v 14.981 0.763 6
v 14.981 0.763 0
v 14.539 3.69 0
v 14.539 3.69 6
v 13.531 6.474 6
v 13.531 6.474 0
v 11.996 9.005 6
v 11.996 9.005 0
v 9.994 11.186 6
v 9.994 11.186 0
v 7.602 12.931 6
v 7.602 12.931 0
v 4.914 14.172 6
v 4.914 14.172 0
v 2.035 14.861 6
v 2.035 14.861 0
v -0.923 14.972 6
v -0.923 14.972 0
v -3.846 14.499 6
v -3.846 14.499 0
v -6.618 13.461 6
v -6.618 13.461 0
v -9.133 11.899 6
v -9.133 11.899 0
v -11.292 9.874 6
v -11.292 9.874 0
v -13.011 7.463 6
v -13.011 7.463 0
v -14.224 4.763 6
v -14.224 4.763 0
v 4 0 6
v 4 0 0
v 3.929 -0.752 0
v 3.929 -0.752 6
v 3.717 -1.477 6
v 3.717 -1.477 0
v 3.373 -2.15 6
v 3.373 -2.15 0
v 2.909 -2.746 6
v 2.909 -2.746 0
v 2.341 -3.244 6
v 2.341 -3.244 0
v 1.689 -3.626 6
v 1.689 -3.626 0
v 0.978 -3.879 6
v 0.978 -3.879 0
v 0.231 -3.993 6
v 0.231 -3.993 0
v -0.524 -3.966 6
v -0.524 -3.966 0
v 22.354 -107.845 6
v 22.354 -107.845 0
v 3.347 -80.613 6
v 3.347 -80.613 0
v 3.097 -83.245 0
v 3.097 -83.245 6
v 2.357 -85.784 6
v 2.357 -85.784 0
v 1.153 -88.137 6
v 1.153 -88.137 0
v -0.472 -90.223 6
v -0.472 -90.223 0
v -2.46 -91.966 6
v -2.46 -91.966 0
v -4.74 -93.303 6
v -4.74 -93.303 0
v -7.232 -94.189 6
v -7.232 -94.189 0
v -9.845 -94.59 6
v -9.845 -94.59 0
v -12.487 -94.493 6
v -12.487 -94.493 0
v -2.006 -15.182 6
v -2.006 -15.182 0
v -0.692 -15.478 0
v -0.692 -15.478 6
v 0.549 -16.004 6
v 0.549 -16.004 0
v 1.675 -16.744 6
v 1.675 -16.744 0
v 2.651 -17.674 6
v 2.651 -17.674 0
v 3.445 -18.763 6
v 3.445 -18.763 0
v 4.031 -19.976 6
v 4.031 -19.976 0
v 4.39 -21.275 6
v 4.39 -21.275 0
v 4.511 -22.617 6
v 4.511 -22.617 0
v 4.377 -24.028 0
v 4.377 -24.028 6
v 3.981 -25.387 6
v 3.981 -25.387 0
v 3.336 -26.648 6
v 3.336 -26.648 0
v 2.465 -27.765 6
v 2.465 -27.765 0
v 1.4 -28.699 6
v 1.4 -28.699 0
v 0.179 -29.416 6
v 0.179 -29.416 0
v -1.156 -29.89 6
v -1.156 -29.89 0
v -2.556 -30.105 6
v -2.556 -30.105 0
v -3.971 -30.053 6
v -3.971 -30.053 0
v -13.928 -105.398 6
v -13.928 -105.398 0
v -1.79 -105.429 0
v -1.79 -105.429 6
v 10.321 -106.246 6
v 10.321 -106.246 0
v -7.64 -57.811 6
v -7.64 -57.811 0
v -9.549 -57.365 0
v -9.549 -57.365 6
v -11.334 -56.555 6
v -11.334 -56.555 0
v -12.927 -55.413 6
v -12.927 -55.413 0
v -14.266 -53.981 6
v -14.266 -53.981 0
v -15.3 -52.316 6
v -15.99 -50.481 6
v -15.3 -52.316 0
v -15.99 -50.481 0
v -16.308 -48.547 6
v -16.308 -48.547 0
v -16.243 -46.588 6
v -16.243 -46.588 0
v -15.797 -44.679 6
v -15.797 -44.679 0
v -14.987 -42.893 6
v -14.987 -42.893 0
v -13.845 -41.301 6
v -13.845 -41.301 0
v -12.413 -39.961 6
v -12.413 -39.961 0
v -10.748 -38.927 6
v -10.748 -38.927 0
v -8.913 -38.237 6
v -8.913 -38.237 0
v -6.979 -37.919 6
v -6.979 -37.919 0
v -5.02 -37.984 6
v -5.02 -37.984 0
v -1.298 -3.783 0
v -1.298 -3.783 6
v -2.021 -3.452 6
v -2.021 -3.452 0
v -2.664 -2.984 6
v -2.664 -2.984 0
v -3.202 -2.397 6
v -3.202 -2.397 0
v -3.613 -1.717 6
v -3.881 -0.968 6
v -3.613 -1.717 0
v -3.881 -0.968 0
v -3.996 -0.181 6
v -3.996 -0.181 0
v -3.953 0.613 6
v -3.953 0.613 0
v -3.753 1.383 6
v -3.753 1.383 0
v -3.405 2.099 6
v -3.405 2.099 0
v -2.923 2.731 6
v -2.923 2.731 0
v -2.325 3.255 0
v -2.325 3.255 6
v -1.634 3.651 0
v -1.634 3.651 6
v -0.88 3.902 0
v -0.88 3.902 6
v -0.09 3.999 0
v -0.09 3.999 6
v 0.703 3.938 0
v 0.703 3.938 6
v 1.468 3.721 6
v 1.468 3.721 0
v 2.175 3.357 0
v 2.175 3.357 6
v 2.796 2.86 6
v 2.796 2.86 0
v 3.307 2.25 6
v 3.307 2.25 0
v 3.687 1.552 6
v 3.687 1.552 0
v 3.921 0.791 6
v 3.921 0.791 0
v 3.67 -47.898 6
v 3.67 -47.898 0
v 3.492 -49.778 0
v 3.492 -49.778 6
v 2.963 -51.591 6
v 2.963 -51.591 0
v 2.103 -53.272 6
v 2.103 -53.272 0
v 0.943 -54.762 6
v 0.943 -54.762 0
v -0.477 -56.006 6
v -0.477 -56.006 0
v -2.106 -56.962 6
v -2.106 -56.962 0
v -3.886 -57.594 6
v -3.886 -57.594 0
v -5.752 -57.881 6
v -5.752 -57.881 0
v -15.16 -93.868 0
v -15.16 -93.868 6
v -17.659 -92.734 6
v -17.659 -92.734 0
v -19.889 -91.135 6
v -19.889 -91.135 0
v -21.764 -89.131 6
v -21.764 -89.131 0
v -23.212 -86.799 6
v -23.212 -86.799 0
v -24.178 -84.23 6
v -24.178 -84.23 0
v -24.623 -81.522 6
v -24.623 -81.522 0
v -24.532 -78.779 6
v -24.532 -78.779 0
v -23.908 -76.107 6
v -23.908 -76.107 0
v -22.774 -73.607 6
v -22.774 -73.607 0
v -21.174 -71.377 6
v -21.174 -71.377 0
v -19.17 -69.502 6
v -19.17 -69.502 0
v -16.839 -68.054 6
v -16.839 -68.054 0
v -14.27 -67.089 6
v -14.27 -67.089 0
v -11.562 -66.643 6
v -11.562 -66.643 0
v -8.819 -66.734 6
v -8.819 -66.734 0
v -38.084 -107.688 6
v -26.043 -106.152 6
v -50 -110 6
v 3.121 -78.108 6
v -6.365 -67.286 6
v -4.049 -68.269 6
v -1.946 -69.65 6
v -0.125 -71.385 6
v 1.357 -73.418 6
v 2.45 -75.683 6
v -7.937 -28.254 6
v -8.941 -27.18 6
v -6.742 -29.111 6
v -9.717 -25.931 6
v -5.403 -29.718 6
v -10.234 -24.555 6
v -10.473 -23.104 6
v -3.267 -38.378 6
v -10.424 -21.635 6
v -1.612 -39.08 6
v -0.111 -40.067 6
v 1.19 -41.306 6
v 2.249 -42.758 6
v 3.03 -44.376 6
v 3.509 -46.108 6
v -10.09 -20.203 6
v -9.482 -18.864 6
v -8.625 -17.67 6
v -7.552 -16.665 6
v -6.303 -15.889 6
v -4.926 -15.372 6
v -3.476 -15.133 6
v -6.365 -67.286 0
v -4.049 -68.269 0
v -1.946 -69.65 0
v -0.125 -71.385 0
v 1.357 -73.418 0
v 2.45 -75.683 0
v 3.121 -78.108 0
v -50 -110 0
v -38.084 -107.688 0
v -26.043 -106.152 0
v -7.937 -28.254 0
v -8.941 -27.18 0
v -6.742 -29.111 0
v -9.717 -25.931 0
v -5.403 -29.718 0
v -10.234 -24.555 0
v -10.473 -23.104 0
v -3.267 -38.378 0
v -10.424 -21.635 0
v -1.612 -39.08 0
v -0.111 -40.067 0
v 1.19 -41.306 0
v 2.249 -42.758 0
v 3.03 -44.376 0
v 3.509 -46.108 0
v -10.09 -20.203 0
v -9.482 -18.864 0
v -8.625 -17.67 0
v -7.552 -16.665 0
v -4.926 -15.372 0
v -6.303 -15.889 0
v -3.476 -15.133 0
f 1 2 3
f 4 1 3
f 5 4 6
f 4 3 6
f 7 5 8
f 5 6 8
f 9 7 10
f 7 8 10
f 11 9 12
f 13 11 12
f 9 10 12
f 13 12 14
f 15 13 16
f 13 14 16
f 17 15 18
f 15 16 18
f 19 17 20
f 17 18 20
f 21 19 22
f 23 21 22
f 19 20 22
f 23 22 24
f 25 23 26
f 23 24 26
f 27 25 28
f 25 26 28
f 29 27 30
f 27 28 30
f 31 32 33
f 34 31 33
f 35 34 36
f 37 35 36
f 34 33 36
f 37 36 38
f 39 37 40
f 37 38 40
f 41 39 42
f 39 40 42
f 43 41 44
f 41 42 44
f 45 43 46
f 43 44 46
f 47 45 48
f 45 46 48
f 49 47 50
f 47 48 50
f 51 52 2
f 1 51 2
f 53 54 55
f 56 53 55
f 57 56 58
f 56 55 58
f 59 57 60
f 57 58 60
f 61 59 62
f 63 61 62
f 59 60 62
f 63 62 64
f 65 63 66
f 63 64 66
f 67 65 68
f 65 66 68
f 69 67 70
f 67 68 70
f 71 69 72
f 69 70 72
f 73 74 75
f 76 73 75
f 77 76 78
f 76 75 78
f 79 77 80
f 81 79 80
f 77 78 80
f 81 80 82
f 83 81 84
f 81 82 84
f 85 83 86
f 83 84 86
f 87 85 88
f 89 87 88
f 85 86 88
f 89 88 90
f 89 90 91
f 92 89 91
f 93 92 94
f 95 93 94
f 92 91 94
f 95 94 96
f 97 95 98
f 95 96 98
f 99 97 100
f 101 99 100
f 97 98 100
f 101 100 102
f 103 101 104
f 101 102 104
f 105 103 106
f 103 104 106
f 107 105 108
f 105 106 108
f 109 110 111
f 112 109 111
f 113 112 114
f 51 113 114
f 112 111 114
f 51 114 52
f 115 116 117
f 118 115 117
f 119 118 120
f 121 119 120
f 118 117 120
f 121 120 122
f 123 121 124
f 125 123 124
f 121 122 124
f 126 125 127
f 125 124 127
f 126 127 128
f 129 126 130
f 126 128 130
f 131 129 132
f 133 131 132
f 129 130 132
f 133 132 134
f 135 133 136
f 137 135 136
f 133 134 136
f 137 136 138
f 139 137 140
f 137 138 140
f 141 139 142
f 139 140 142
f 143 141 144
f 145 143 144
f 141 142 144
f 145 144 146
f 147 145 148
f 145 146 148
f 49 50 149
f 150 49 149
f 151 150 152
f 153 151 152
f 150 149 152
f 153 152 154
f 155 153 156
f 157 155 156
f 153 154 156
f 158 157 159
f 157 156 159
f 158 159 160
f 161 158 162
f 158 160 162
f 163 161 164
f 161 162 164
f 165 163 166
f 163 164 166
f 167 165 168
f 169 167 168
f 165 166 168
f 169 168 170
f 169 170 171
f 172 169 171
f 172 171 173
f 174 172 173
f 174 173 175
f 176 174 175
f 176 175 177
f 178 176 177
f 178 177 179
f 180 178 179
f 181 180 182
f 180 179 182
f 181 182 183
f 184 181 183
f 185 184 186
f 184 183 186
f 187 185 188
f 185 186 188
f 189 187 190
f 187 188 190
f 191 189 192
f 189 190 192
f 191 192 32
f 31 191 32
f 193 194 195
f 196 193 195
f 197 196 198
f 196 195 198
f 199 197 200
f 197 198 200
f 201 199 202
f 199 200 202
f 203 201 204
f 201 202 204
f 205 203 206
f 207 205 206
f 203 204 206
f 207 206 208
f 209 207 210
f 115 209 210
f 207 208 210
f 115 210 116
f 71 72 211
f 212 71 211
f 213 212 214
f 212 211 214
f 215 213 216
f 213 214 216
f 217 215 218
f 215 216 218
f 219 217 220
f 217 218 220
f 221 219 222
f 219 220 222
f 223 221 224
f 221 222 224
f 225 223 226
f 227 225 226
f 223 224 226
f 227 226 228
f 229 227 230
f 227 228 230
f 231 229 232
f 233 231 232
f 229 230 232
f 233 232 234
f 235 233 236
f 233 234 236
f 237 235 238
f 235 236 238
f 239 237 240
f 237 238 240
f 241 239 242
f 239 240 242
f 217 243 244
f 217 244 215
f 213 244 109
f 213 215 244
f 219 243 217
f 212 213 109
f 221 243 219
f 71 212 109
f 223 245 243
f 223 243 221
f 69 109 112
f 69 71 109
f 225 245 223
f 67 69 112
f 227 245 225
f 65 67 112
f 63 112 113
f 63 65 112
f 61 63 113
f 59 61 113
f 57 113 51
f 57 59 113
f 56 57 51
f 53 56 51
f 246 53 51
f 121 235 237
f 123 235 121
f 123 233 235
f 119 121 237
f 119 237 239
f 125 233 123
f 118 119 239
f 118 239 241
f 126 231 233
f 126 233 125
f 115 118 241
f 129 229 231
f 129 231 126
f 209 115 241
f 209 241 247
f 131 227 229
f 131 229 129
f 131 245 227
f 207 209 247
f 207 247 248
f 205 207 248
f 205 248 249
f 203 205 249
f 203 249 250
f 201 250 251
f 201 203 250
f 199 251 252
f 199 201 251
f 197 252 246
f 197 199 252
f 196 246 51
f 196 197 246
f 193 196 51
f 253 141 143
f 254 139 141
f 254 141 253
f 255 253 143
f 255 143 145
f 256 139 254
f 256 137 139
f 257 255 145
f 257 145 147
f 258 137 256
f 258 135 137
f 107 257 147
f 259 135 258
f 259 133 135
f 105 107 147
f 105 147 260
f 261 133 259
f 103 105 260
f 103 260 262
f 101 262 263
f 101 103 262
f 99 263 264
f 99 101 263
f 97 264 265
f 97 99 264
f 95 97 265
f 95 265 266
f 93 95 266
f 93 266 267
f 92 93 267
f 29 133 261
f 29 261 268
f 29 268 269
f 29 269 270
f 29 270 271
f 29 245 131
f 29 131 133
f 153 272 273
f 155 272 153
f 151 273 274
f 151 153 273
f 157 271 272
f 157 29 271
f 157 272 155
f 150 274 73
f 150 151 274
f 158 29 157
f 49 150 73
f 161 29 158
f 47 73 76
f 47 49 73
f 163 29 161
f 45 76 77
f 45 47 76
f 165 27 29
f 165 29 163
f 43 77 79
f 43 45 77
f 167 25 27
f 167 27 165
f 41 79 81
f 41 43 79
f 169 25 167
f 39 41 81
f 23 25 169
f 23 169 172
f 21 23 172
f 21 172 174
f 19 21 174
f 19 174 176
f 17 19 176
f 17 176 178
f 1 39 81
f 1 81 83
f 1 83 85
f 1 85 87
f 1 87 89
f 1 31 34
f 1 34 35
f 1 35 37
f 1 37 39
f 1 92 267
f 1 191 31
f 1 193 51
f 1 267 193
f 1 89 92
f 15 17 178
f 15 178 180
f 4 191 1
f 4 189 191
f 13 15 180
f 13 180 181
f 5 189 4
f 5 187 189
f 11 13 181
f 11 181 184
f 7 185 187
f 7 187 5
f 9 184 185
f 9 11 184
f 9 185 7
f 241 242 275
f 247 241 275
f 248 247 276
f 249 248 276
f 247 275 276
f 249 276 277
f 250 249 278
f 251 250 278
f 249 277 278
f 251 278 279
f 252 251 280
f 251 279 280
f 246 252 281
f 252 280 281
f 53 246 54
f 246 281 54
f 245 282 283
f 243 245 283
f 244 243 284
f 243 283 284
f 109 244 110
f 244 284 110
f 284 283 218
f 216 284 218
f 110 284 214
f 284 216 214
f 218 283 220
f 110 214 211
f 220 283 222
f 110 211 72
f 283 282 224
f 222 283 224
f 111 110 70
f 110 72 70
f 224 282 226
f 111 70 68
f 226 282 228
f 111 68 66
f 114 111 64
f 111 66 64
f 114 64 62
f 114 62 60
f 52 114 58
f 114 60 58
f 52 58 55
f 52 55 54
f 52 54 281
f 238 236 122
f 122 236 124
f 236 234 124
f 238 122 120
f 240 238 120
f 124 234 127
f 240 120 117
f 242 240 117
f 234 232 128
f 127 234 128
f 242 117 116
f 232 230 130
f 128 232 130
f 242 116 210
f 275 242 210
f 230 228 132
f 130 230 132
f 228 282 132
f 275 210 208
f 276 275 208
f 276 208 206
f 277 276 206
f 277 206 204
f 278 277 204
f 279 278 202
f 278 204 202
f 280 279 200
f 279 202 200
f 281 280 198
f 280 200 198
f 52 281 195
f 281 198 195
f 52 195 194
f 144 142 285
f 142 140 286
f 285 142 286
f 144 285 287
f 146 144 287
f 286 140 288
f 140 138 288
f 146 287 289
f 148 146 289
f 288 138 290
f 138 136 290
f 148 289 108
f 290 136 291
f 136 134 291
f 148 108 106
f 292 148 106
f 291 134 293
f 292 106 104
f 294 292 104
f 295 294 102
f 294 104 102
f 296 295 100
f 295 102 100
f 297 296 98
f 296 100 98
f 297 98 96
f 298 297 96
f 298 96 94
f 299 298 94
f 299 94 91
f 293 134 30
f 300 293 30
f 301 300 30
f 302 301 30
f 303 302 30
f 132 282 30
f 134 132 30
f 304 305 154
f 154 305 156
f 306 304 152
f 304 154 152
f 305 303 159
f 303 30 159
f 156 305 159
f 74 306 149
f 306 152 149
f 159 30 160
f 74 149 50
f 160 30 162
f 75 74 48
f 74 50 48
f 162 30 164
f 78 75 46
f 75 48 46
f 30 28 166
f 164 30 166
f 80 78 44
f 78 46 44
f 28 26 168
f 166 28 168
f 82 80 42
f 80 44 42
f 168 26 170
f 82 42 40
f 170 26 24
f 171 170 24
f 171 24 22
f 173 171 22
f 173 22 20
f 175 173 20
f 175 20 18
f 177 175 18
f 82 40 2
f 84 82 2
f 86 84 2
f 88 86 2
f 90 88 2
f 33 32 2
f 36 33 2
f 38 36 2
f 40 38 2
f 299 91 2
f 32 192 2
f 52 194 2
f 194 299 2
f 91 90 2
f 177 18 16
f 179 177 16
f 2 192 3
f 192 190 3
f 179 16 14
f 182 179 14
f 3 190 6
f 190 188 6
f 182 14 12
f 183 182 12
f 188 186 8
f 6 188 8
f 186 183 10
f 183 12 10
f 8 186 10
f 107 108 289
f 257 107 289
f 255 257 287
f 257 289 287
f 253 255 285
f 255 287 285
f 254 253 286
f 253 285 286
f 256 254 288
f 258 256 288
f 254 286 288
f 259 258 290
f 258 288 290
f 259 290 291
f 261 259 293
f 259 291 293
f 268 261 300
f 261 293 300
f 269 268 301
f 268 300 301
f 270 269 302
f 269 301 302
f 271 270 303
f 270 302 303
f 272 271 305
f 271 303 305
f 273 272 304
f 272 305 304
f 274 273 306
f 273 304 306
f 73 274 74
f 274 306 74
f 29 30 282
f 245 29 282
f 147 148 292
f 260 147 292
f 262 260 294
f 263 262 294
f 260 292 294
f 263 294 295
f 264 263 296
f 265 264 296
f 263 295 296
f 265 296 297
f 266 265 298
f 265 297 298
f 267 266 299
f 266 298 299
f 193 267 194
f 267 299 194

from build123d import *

# Parameters (mm, degrees)
F1_DEPTH = 6


with BuildPart() as f1:
    # F0 (on Top) → F1 (new body)
    with BuildSketch(Plane.XY):
        with BuildLine():
            ThreePointArc((-0.524037, -3.965525), (2.636651, -3.008002), (4, 0))
            ThreePointArc((4, 0), (-2.636651, 3.008002), (-0.524037, -3.965525))
        make_face()
        with BuildLine():
            ThreePointArc((-50, -110), (-32.075898, -106.82234), (-13.928128, -105.397782))
            ThreePointArc((-13.928128, -105.397782), (4.272256, -105.739751), (22.353704, -107.845026))
            Line((22.353704, -107.845026), (14.980582, 0.76299))
            ThreePointArc((14.980582, 0.76299), (2.035325, 14.861274), (-14.223815, 4.762676))
            Line((-14.223815, 4.762676), (-50, -110))
        make_face()
        with BuildLine():
            ThreePointArc((-12.487026, -94.492589), (-24.532233, -78.779123), (-8.818768, -66.733917))
            ThreePointArc((-8.818768, -66.733917), (-0.124891, -71.384976), (3.347103, -80.613253))
            ThreePointArc((3.347103, -80.613253), (-1.42462, -91.141259), (-12.487026, -94.492589))
        make_face(mode=Mode.SUBTRACT)
        with BuildLine():
            ThreePointArc((-7.639684, -57.811486), (-16.243403, -46.587583), (-5.0195, -37.983864))
            ThreePointArc((-5.0195, -37.983864), (1.190412, -41.306049), (3.670408, -47.897675))
            ThreePointArc((3.670408, -47.897675), (0.262034, -55.417679), (-7.639684, -57.811486))
        make_face(mode=Mode.SUBTRACT)
        with BuildLine():
            ThreePointArc((-3.971426, -30.052814), (-10.424215, -21.634886), (-2.006287, -15.182097))
            ThreePointArc((-2.006287, -15.182097), (2.651147, -17.673736), (4.511144, -22.617456))
            ThreePointArc((4.511144, -22.617456), (1.954863, -28.257459), (-3.971426, -30.052814))
        make_face(mode=Mode.SUBTRACT)
        with BuildLine():
            ThreePointArc((-0.524037, -3.965525), (-2.636651, 3.008002), (4, 0))
            ThreePointArc((4, 0), (2.636651, -3.008002), (-0.524037, -3.965525))
        make_face(mode=Mode.SUBTRACT)
    extrude(amount=F1_DEPTH)


solid = f1.part
